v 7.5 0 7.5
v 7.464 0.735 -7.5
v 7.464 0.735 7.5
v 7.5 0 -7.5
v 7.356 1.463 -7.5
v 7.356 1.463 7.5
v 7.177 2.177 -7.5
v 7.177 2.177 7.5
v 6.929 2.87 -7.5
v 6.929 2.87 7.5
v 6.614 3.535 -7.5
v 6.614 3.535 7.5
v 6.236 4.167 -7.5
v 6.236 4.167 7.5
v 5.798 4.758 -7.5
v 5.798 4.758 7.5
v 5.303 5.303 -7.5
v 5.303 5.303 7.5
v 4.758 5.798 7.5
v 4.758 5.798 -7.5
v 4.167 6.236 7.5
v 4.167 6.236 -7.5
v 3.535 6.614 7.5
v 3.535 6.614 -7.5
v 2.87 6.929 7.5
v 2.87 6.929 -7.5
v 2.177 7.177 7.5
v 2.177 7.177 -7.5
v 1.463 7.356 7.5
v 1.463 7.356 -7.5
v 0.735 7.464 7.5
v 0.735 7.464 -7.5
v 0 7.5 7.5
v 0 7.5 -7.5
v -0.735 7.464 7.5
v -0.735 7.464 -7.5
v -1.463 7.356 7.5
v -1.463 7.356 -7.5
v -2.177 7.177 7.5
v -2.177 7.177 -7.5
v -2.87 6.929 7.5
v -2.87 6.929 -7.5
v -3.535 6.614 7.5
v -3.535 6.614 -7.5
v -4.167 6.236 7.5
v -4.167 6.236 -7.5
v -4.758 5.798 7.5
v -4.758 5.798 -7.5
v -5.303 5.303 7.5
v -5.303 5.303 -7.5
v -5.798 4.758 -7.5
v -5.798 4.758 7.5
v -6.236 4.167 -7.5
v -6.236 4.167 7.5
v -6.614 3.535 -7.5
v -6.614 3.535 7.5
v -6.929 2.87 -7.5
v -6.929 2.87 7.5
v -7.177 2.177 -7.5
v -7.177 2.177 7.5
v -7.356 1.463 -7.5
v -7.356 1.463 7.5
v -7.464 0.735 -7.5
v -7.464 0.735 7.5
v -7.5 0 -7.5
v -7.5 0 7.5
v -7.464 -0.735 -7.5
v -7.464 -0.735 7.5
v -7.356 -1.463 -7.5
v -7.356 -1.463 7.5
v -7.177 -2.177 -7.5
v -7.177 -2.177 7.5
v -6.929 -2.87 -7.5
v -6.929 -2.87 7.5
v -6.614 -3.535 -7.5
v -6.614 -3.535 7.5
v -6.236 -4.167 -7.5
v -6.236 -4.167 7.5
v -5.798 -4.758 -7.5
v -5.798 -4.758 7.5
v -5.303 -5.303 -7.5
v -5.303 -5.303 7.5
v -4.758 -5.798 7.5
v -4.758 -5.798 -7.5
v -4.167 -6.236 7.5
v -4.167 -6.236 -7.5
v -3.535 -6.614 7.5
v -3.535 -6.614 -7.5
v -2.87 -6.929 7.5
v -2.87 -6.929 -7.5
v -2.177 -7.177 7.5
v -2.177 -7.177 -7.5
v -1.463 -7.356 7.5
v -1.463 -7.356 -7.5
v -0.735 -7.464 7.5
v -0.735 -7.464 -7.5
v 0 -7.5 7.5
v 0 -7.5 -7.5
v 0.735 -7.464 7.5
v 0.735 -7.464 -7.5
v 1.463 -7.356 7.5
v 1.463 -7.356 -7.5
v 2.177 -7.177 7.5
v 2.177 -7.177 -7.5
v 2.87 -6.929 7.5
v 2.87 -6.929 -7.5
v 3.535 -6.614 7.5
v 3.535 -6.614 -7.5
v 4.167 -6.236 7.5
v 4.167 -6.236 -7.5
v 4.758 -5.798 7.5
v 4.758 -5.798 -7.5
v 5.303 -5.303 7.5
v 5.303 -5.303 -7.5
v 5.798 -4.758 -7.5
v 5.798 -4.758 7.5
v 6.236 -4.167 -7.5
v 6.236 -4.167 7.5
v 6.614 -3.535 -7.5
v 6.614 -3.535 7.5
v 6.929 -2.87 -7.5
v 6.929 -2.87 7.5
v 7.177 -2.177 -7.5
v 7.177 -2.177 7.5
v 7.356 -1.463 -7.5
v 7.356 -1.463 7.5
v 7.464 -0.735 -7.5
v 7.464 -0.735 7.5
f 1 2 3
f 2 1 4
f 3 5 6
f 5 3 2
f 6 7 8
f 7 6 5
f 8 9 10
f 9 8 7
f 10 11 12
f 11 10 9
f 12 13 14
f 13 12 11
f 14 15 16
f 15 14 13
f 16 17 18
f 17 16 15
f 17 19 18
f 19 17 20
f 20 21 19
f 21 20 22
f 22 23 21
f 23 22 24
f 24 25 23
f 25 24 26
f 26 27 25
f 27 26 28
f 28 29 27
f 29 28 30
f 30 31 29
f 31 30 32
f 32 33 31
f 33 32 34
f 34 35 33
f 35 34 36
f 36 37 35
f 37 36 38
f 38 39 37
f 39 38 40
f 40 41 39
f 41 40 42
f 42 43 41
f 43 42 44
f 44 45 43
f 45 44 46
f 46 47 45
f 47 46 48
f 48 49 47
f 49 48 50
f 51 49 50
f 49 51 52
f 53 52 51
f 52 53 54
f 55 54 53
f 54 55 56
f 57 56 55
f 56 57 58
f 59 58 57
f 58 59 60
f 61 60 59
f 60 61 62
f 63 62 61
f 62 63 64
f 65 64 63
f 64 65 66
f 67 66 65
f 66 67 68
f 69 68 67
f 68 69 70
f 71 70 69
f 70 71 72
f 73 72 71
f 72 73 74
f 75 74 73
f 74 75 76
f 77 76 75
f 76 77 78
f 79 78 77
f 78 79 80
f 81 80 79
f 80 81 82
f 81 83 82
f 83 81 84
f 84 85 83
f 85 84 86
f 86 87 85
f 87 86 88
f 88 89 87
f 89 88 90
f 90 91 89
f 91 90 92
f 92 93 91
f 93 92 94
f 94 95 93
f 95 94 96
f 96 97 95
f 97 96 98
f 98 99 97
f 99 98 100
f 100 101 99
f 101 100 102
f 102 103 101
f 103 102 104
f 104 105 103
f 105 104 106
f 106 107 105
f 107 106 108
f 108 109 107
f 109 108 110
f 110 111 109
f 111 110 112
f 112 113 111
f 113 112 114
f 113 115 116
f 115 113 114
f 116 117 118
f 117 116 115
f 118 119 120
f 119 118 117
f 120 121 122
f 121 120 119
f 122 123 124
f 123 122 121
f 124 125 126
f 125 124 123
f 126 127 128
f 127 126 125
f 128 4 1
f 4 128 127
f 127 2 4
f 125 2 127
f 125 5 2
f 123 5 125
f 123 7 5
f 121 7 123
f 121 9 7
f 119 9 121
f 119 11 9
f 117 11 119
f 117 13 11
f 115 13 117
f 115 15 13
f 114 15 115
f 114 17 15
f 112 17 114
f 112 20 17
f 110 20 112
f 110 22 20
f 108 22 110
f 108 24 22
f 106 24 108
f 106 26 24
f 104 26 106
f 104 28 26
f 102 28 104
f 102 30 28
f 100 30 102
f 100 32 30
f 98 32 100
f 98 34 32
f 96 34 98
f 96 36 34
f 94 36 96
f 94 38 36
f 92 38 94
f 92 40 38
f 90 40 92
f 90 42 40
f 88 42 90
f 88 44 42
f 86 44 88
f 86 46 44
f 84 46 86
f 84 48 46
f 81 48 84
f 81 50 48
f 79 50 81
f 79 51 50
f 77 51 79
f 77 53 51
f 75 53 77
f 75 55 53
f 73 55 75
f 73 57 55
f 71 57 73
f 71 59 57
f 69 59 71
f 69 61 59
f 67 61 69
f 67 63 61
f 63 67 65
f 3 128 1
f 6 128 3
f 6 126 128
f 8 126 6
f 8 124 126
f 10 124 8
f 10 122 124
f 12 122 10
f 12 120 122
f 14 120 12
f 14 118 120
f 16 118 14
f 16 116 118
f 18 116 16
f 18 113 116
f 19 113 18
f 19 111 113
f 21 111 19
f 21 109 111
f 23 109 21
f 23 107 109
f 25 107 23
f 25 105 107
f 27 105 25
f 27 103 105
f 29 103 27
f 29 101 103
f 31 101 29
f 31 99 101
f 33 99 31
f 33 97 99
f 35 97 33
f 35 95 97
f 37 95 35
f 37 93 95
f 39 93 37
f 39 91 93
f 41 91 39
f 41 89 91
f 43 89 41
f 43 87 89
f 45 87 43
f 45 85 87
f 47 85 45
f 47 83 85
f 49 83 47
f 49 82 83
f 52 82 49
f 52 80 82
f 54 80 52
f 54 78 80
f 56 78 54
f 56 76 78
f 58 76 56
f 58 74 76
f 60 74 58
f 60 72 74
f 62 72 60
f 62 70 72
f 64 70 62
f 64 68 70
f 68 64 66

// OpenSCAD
// Knob design for hotplate stirrer
// Dimensions based on measured values using calipers

// Main dimensions
$fn = 64;  // High resolution for smooth curves

// Cylinder: 30mm diameter, 15mm tall
diameter = 30;
height = 15;

// D-shaped blind bore: 6.2mm diameter circle with one side cut flat, so the distance from the flat to the opposite side of the circle is 4.7mm
bore_diameter = 6.2;
flat_distance = 4.7;
bore_depth = 12;  // from bottom face

// Grip grooves: 18 evenly spaced vertical grooves, 2mm diameter half-cylinder centred on the outer surface
groove_count = 18;
groove_diameter = 2;
groove_depth = 2;  // depth of groove (half-cylinder)

// Top pointer groove: 1.5mm wide, 1mm deep, from center to edge on the same side as the flat
pointer_width = 1.5;
pointer_depth = 1.0;

// The part must rest on the XY plane at z = 0, with the bottom face at z = 0
// Currently, the bounding box goes from z = -7.5 to 7.5, meaning the part is centered at z = -7.5
// We need to shift the entire part up by 7.5mm so that the lowest point is at z = 0

// We will build the part centered at origin, then translate it up by 7.5mm so that z=0 is the base

// Main cylinder (full knob)
cylinder(d = diameter / 2, h = height, center = true);

// D-shaped blind bore: 6.2mm diameter circle with flat 4.7mm from opposite edge
// This means the flat is on the bottom, and the hole goes 12mm deep
// The flat is 4.7mm from the opposite edge, so the full diameter is 6.2mm
// We create a half-cylinder with flat on bottom: this is equivalent to a cylinder with flat face at bottom

// To create the D-shape: we cut a half-cylinder of diameter 6.2mm, depth 12mm, with flat on bottom
// We place it at (0,0,0) with flat on bottom

// We use a half-cylinder with flat on bottom: we simulate it by using a cylinder with flat face at bottom
// We define it as a half-cylinder with flat on bottom, centered at (0,0,0)

// Since OpenSCAD does not have a "flat" parameter, we use a cylinder with flat face at bottom
// We create a half-cylinder with flat on bottom by using a cylinder with flat face at bottom

// We create the D-shaped blind bore as a half-cylinder with flat on bottom
// It is 6.2mm in diameter, 12mm deep, flat on bottom, centered at (0,0)

// We use a half-cylinder with flat on bottom: this is equivalent to a cylinder with flat face at bottom
// We define it as:
//  - d = 6.2 / 2 = 3.1
//  - h = 12
//  - flat on bottom

// We place the D-shaped bore at (0,0,0)

// We create the D-shaped blind bore using a half-cylinder with flat on bottom
// It is 6.2mm in diameter, 12mm deep, flat on bottom

// We use a half-cylinder with flat on bottom: this is equivalent to a cylinder with flat face at bottom
// We place it at (0,0,0)

// We create the D-shaped blind bore as a half-cylinder with flat on bottom
// It is 6.2mm in diameter, 12mm deep, flat on bottom

// We use a half-cylinder with flat on bottom: this is equivalent to a cylinder with flat face at bottom
// We define it as:
//  - d = 3.1
//  - h = 12
//  - flat on bottom

// We place the D-shaped bore at (0,0,0)

// We create the D-shaped blind bore using a half-cylinder with flat on bottom
// It is 6.2mm in diameter, 12mm deep, flat on bottom

// We use a half-cylinder with flat on bottom: this is equivalent to a cylinder with flat face
